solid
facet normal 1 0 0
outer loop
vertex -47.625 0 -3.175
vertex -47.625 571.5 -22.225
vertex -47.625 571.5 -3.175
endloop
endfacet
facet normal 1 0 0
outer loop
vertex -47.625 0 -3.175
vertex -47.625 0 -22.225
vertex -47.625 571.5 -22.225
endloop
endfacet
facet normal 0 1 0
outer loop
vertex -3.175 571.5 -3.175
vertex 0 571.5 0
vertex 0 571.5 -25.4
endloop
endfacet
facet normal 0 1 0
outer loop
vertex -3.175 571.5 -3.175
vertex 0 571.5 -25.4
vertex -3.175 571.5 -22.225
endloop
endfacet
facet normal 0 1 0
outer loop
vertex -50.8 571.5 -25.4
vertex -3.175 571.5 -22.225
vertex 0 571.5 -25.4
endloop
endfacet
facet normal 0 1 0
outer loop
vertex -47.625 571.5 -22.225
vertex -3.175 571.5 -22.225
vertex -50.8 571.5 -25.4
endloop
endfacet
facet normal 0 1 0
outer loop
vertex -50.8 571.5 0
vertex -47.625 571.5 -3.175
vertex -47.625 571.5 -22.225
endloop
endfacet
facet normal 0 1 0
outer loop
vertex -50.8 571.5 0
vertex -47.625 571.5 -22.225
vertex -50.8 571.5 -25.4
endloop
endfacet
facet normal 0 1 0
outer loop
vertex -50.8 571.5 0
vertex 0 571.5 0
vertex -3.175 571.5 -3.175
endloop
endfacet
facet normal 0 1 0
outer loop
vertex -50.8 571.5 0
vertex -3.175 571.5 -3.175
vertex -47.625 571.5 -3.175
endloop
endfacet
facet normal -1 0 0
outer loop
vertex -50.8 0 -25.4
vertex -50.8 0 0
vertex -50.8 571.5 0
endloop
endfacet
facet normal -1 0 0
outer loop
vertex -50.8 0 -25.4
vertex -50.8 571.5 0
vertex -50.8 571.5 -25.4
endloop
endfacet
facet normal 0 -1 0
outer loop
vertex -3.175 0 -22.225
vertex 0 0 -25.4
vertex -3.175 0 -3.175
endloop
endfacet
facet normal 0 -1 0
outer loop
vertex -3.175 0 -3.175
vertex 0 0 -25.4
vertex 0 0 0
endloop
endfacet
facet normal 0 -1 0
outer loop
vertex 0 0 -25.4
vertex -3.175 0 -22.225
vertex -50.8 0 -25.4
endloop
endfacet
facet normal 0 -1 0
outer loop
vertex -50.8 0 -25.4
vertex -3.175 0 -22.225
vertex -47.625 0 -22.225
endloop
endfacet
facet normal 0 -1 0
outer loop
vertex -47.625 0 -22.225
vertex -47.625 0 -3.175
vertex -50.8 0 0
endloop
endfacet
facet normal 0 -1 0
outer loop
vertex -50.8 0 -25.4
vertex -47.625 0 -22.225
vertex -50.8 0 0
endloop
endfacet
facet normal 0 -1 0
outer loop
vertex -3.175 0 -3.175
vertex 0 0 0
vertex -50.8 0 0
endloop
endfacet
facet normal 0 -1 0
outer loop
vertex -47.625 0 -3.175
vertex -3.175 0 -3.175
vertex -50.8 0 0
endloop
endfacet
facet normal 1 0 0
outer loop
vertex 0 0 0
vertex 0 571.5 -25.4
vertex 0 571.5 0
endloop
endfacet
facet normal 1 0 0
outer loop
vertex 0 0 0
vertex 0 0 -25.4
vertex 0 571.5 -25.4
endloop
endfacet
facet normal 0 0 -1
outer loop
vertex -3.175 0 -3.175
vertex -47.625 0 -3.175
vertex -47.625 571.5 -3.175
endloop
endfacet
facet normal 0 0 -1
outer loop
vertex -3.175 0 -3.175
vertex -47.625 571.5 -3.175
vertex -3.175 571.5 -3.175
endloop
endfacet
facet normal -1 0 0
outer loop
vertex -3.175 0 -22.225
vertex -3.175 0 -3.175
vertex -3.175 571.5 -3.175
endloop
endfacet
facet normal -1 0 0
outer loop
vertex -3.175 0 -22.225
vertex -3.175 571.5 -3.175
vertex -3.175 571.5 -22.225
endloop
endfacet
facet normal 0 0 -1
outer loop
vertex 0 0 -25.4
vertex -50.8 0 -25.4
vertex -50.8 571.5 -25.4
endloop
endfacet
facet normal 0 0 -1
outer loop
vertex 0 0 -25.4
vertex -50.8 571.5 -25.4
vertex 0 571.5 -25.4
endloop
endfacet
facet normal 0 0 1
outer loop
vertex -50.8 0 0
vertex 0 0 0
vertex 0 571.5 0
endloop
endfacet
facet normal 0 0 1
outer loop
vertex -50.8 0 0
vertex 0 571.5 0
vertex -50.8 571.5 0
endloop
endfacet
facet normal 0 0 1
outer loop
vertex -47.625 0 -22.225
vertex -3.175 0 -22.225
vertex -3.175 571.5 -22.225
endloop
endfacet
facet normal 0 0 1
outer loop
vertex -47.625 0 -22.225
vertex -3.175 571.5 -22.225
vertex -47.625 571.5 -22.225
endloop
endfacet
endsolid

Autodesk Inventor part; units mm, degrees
ref_plane "YZ Plane" through (0, 0, 0) normal (1, 0, 0) x (0, 1, 0)
ref_plane "XZ Plane" through (0, 0, 0) normal (0, 1, 0) x (-1, 0, 0)
ref_plane "XY Plane" through (0, 0, 0) normal (0, 0, 1) x (1, 0, 0)
sketch "Sketch1" plane through (0, 0, 0) normal (0, 1, 0) x (-1, 0, 0)
  line L0 (0, 0) -> (50.8, 0)
  line L1 (50.8, 0) -> (50.8, -25.4)
  line L2 (50.8, -25.4) -> (0, -25.4)
  line L3 (0, -25.4) -> (0, 0)
  line L4 (47.625, -22.225) -> (47.625, -3.175)
  line L5 (47.625, -3.175) -> (3.175, -3.175)
  line L6 (3.175, -3.175) -> (3.175, -22.225)
  line L7 (3.175, -22.225) -> (47.625, -22.225)
  dimension "d0" = 25.4
  dimension "d1" = 50.8
  dimension "d2" = 3.175
extrude "Extrusion1" add sketch "Sketch1" along normal blind 571.5
sketch "Sketch2" plane through (-50.8, 0, 0) normal (0, 0, 1) x (1, 0, 0)
  line L0 (0, 0) -> (0, 571.5) projected
  line L1 (50.8, 0) -> (0, 0) projected
  line L2 (0, 571.5) -> (50.8, 571.5) projected
  point P0 (25.4, 25.4)
  point P1 (25.4, 546.1)
  dimension "d5" = 25.4
  dimension "d6" = 25.4
  dimension "d7" = 25.4
  dimension "d8" = 25.4
properties part number "LiftBase-1111-2020"
